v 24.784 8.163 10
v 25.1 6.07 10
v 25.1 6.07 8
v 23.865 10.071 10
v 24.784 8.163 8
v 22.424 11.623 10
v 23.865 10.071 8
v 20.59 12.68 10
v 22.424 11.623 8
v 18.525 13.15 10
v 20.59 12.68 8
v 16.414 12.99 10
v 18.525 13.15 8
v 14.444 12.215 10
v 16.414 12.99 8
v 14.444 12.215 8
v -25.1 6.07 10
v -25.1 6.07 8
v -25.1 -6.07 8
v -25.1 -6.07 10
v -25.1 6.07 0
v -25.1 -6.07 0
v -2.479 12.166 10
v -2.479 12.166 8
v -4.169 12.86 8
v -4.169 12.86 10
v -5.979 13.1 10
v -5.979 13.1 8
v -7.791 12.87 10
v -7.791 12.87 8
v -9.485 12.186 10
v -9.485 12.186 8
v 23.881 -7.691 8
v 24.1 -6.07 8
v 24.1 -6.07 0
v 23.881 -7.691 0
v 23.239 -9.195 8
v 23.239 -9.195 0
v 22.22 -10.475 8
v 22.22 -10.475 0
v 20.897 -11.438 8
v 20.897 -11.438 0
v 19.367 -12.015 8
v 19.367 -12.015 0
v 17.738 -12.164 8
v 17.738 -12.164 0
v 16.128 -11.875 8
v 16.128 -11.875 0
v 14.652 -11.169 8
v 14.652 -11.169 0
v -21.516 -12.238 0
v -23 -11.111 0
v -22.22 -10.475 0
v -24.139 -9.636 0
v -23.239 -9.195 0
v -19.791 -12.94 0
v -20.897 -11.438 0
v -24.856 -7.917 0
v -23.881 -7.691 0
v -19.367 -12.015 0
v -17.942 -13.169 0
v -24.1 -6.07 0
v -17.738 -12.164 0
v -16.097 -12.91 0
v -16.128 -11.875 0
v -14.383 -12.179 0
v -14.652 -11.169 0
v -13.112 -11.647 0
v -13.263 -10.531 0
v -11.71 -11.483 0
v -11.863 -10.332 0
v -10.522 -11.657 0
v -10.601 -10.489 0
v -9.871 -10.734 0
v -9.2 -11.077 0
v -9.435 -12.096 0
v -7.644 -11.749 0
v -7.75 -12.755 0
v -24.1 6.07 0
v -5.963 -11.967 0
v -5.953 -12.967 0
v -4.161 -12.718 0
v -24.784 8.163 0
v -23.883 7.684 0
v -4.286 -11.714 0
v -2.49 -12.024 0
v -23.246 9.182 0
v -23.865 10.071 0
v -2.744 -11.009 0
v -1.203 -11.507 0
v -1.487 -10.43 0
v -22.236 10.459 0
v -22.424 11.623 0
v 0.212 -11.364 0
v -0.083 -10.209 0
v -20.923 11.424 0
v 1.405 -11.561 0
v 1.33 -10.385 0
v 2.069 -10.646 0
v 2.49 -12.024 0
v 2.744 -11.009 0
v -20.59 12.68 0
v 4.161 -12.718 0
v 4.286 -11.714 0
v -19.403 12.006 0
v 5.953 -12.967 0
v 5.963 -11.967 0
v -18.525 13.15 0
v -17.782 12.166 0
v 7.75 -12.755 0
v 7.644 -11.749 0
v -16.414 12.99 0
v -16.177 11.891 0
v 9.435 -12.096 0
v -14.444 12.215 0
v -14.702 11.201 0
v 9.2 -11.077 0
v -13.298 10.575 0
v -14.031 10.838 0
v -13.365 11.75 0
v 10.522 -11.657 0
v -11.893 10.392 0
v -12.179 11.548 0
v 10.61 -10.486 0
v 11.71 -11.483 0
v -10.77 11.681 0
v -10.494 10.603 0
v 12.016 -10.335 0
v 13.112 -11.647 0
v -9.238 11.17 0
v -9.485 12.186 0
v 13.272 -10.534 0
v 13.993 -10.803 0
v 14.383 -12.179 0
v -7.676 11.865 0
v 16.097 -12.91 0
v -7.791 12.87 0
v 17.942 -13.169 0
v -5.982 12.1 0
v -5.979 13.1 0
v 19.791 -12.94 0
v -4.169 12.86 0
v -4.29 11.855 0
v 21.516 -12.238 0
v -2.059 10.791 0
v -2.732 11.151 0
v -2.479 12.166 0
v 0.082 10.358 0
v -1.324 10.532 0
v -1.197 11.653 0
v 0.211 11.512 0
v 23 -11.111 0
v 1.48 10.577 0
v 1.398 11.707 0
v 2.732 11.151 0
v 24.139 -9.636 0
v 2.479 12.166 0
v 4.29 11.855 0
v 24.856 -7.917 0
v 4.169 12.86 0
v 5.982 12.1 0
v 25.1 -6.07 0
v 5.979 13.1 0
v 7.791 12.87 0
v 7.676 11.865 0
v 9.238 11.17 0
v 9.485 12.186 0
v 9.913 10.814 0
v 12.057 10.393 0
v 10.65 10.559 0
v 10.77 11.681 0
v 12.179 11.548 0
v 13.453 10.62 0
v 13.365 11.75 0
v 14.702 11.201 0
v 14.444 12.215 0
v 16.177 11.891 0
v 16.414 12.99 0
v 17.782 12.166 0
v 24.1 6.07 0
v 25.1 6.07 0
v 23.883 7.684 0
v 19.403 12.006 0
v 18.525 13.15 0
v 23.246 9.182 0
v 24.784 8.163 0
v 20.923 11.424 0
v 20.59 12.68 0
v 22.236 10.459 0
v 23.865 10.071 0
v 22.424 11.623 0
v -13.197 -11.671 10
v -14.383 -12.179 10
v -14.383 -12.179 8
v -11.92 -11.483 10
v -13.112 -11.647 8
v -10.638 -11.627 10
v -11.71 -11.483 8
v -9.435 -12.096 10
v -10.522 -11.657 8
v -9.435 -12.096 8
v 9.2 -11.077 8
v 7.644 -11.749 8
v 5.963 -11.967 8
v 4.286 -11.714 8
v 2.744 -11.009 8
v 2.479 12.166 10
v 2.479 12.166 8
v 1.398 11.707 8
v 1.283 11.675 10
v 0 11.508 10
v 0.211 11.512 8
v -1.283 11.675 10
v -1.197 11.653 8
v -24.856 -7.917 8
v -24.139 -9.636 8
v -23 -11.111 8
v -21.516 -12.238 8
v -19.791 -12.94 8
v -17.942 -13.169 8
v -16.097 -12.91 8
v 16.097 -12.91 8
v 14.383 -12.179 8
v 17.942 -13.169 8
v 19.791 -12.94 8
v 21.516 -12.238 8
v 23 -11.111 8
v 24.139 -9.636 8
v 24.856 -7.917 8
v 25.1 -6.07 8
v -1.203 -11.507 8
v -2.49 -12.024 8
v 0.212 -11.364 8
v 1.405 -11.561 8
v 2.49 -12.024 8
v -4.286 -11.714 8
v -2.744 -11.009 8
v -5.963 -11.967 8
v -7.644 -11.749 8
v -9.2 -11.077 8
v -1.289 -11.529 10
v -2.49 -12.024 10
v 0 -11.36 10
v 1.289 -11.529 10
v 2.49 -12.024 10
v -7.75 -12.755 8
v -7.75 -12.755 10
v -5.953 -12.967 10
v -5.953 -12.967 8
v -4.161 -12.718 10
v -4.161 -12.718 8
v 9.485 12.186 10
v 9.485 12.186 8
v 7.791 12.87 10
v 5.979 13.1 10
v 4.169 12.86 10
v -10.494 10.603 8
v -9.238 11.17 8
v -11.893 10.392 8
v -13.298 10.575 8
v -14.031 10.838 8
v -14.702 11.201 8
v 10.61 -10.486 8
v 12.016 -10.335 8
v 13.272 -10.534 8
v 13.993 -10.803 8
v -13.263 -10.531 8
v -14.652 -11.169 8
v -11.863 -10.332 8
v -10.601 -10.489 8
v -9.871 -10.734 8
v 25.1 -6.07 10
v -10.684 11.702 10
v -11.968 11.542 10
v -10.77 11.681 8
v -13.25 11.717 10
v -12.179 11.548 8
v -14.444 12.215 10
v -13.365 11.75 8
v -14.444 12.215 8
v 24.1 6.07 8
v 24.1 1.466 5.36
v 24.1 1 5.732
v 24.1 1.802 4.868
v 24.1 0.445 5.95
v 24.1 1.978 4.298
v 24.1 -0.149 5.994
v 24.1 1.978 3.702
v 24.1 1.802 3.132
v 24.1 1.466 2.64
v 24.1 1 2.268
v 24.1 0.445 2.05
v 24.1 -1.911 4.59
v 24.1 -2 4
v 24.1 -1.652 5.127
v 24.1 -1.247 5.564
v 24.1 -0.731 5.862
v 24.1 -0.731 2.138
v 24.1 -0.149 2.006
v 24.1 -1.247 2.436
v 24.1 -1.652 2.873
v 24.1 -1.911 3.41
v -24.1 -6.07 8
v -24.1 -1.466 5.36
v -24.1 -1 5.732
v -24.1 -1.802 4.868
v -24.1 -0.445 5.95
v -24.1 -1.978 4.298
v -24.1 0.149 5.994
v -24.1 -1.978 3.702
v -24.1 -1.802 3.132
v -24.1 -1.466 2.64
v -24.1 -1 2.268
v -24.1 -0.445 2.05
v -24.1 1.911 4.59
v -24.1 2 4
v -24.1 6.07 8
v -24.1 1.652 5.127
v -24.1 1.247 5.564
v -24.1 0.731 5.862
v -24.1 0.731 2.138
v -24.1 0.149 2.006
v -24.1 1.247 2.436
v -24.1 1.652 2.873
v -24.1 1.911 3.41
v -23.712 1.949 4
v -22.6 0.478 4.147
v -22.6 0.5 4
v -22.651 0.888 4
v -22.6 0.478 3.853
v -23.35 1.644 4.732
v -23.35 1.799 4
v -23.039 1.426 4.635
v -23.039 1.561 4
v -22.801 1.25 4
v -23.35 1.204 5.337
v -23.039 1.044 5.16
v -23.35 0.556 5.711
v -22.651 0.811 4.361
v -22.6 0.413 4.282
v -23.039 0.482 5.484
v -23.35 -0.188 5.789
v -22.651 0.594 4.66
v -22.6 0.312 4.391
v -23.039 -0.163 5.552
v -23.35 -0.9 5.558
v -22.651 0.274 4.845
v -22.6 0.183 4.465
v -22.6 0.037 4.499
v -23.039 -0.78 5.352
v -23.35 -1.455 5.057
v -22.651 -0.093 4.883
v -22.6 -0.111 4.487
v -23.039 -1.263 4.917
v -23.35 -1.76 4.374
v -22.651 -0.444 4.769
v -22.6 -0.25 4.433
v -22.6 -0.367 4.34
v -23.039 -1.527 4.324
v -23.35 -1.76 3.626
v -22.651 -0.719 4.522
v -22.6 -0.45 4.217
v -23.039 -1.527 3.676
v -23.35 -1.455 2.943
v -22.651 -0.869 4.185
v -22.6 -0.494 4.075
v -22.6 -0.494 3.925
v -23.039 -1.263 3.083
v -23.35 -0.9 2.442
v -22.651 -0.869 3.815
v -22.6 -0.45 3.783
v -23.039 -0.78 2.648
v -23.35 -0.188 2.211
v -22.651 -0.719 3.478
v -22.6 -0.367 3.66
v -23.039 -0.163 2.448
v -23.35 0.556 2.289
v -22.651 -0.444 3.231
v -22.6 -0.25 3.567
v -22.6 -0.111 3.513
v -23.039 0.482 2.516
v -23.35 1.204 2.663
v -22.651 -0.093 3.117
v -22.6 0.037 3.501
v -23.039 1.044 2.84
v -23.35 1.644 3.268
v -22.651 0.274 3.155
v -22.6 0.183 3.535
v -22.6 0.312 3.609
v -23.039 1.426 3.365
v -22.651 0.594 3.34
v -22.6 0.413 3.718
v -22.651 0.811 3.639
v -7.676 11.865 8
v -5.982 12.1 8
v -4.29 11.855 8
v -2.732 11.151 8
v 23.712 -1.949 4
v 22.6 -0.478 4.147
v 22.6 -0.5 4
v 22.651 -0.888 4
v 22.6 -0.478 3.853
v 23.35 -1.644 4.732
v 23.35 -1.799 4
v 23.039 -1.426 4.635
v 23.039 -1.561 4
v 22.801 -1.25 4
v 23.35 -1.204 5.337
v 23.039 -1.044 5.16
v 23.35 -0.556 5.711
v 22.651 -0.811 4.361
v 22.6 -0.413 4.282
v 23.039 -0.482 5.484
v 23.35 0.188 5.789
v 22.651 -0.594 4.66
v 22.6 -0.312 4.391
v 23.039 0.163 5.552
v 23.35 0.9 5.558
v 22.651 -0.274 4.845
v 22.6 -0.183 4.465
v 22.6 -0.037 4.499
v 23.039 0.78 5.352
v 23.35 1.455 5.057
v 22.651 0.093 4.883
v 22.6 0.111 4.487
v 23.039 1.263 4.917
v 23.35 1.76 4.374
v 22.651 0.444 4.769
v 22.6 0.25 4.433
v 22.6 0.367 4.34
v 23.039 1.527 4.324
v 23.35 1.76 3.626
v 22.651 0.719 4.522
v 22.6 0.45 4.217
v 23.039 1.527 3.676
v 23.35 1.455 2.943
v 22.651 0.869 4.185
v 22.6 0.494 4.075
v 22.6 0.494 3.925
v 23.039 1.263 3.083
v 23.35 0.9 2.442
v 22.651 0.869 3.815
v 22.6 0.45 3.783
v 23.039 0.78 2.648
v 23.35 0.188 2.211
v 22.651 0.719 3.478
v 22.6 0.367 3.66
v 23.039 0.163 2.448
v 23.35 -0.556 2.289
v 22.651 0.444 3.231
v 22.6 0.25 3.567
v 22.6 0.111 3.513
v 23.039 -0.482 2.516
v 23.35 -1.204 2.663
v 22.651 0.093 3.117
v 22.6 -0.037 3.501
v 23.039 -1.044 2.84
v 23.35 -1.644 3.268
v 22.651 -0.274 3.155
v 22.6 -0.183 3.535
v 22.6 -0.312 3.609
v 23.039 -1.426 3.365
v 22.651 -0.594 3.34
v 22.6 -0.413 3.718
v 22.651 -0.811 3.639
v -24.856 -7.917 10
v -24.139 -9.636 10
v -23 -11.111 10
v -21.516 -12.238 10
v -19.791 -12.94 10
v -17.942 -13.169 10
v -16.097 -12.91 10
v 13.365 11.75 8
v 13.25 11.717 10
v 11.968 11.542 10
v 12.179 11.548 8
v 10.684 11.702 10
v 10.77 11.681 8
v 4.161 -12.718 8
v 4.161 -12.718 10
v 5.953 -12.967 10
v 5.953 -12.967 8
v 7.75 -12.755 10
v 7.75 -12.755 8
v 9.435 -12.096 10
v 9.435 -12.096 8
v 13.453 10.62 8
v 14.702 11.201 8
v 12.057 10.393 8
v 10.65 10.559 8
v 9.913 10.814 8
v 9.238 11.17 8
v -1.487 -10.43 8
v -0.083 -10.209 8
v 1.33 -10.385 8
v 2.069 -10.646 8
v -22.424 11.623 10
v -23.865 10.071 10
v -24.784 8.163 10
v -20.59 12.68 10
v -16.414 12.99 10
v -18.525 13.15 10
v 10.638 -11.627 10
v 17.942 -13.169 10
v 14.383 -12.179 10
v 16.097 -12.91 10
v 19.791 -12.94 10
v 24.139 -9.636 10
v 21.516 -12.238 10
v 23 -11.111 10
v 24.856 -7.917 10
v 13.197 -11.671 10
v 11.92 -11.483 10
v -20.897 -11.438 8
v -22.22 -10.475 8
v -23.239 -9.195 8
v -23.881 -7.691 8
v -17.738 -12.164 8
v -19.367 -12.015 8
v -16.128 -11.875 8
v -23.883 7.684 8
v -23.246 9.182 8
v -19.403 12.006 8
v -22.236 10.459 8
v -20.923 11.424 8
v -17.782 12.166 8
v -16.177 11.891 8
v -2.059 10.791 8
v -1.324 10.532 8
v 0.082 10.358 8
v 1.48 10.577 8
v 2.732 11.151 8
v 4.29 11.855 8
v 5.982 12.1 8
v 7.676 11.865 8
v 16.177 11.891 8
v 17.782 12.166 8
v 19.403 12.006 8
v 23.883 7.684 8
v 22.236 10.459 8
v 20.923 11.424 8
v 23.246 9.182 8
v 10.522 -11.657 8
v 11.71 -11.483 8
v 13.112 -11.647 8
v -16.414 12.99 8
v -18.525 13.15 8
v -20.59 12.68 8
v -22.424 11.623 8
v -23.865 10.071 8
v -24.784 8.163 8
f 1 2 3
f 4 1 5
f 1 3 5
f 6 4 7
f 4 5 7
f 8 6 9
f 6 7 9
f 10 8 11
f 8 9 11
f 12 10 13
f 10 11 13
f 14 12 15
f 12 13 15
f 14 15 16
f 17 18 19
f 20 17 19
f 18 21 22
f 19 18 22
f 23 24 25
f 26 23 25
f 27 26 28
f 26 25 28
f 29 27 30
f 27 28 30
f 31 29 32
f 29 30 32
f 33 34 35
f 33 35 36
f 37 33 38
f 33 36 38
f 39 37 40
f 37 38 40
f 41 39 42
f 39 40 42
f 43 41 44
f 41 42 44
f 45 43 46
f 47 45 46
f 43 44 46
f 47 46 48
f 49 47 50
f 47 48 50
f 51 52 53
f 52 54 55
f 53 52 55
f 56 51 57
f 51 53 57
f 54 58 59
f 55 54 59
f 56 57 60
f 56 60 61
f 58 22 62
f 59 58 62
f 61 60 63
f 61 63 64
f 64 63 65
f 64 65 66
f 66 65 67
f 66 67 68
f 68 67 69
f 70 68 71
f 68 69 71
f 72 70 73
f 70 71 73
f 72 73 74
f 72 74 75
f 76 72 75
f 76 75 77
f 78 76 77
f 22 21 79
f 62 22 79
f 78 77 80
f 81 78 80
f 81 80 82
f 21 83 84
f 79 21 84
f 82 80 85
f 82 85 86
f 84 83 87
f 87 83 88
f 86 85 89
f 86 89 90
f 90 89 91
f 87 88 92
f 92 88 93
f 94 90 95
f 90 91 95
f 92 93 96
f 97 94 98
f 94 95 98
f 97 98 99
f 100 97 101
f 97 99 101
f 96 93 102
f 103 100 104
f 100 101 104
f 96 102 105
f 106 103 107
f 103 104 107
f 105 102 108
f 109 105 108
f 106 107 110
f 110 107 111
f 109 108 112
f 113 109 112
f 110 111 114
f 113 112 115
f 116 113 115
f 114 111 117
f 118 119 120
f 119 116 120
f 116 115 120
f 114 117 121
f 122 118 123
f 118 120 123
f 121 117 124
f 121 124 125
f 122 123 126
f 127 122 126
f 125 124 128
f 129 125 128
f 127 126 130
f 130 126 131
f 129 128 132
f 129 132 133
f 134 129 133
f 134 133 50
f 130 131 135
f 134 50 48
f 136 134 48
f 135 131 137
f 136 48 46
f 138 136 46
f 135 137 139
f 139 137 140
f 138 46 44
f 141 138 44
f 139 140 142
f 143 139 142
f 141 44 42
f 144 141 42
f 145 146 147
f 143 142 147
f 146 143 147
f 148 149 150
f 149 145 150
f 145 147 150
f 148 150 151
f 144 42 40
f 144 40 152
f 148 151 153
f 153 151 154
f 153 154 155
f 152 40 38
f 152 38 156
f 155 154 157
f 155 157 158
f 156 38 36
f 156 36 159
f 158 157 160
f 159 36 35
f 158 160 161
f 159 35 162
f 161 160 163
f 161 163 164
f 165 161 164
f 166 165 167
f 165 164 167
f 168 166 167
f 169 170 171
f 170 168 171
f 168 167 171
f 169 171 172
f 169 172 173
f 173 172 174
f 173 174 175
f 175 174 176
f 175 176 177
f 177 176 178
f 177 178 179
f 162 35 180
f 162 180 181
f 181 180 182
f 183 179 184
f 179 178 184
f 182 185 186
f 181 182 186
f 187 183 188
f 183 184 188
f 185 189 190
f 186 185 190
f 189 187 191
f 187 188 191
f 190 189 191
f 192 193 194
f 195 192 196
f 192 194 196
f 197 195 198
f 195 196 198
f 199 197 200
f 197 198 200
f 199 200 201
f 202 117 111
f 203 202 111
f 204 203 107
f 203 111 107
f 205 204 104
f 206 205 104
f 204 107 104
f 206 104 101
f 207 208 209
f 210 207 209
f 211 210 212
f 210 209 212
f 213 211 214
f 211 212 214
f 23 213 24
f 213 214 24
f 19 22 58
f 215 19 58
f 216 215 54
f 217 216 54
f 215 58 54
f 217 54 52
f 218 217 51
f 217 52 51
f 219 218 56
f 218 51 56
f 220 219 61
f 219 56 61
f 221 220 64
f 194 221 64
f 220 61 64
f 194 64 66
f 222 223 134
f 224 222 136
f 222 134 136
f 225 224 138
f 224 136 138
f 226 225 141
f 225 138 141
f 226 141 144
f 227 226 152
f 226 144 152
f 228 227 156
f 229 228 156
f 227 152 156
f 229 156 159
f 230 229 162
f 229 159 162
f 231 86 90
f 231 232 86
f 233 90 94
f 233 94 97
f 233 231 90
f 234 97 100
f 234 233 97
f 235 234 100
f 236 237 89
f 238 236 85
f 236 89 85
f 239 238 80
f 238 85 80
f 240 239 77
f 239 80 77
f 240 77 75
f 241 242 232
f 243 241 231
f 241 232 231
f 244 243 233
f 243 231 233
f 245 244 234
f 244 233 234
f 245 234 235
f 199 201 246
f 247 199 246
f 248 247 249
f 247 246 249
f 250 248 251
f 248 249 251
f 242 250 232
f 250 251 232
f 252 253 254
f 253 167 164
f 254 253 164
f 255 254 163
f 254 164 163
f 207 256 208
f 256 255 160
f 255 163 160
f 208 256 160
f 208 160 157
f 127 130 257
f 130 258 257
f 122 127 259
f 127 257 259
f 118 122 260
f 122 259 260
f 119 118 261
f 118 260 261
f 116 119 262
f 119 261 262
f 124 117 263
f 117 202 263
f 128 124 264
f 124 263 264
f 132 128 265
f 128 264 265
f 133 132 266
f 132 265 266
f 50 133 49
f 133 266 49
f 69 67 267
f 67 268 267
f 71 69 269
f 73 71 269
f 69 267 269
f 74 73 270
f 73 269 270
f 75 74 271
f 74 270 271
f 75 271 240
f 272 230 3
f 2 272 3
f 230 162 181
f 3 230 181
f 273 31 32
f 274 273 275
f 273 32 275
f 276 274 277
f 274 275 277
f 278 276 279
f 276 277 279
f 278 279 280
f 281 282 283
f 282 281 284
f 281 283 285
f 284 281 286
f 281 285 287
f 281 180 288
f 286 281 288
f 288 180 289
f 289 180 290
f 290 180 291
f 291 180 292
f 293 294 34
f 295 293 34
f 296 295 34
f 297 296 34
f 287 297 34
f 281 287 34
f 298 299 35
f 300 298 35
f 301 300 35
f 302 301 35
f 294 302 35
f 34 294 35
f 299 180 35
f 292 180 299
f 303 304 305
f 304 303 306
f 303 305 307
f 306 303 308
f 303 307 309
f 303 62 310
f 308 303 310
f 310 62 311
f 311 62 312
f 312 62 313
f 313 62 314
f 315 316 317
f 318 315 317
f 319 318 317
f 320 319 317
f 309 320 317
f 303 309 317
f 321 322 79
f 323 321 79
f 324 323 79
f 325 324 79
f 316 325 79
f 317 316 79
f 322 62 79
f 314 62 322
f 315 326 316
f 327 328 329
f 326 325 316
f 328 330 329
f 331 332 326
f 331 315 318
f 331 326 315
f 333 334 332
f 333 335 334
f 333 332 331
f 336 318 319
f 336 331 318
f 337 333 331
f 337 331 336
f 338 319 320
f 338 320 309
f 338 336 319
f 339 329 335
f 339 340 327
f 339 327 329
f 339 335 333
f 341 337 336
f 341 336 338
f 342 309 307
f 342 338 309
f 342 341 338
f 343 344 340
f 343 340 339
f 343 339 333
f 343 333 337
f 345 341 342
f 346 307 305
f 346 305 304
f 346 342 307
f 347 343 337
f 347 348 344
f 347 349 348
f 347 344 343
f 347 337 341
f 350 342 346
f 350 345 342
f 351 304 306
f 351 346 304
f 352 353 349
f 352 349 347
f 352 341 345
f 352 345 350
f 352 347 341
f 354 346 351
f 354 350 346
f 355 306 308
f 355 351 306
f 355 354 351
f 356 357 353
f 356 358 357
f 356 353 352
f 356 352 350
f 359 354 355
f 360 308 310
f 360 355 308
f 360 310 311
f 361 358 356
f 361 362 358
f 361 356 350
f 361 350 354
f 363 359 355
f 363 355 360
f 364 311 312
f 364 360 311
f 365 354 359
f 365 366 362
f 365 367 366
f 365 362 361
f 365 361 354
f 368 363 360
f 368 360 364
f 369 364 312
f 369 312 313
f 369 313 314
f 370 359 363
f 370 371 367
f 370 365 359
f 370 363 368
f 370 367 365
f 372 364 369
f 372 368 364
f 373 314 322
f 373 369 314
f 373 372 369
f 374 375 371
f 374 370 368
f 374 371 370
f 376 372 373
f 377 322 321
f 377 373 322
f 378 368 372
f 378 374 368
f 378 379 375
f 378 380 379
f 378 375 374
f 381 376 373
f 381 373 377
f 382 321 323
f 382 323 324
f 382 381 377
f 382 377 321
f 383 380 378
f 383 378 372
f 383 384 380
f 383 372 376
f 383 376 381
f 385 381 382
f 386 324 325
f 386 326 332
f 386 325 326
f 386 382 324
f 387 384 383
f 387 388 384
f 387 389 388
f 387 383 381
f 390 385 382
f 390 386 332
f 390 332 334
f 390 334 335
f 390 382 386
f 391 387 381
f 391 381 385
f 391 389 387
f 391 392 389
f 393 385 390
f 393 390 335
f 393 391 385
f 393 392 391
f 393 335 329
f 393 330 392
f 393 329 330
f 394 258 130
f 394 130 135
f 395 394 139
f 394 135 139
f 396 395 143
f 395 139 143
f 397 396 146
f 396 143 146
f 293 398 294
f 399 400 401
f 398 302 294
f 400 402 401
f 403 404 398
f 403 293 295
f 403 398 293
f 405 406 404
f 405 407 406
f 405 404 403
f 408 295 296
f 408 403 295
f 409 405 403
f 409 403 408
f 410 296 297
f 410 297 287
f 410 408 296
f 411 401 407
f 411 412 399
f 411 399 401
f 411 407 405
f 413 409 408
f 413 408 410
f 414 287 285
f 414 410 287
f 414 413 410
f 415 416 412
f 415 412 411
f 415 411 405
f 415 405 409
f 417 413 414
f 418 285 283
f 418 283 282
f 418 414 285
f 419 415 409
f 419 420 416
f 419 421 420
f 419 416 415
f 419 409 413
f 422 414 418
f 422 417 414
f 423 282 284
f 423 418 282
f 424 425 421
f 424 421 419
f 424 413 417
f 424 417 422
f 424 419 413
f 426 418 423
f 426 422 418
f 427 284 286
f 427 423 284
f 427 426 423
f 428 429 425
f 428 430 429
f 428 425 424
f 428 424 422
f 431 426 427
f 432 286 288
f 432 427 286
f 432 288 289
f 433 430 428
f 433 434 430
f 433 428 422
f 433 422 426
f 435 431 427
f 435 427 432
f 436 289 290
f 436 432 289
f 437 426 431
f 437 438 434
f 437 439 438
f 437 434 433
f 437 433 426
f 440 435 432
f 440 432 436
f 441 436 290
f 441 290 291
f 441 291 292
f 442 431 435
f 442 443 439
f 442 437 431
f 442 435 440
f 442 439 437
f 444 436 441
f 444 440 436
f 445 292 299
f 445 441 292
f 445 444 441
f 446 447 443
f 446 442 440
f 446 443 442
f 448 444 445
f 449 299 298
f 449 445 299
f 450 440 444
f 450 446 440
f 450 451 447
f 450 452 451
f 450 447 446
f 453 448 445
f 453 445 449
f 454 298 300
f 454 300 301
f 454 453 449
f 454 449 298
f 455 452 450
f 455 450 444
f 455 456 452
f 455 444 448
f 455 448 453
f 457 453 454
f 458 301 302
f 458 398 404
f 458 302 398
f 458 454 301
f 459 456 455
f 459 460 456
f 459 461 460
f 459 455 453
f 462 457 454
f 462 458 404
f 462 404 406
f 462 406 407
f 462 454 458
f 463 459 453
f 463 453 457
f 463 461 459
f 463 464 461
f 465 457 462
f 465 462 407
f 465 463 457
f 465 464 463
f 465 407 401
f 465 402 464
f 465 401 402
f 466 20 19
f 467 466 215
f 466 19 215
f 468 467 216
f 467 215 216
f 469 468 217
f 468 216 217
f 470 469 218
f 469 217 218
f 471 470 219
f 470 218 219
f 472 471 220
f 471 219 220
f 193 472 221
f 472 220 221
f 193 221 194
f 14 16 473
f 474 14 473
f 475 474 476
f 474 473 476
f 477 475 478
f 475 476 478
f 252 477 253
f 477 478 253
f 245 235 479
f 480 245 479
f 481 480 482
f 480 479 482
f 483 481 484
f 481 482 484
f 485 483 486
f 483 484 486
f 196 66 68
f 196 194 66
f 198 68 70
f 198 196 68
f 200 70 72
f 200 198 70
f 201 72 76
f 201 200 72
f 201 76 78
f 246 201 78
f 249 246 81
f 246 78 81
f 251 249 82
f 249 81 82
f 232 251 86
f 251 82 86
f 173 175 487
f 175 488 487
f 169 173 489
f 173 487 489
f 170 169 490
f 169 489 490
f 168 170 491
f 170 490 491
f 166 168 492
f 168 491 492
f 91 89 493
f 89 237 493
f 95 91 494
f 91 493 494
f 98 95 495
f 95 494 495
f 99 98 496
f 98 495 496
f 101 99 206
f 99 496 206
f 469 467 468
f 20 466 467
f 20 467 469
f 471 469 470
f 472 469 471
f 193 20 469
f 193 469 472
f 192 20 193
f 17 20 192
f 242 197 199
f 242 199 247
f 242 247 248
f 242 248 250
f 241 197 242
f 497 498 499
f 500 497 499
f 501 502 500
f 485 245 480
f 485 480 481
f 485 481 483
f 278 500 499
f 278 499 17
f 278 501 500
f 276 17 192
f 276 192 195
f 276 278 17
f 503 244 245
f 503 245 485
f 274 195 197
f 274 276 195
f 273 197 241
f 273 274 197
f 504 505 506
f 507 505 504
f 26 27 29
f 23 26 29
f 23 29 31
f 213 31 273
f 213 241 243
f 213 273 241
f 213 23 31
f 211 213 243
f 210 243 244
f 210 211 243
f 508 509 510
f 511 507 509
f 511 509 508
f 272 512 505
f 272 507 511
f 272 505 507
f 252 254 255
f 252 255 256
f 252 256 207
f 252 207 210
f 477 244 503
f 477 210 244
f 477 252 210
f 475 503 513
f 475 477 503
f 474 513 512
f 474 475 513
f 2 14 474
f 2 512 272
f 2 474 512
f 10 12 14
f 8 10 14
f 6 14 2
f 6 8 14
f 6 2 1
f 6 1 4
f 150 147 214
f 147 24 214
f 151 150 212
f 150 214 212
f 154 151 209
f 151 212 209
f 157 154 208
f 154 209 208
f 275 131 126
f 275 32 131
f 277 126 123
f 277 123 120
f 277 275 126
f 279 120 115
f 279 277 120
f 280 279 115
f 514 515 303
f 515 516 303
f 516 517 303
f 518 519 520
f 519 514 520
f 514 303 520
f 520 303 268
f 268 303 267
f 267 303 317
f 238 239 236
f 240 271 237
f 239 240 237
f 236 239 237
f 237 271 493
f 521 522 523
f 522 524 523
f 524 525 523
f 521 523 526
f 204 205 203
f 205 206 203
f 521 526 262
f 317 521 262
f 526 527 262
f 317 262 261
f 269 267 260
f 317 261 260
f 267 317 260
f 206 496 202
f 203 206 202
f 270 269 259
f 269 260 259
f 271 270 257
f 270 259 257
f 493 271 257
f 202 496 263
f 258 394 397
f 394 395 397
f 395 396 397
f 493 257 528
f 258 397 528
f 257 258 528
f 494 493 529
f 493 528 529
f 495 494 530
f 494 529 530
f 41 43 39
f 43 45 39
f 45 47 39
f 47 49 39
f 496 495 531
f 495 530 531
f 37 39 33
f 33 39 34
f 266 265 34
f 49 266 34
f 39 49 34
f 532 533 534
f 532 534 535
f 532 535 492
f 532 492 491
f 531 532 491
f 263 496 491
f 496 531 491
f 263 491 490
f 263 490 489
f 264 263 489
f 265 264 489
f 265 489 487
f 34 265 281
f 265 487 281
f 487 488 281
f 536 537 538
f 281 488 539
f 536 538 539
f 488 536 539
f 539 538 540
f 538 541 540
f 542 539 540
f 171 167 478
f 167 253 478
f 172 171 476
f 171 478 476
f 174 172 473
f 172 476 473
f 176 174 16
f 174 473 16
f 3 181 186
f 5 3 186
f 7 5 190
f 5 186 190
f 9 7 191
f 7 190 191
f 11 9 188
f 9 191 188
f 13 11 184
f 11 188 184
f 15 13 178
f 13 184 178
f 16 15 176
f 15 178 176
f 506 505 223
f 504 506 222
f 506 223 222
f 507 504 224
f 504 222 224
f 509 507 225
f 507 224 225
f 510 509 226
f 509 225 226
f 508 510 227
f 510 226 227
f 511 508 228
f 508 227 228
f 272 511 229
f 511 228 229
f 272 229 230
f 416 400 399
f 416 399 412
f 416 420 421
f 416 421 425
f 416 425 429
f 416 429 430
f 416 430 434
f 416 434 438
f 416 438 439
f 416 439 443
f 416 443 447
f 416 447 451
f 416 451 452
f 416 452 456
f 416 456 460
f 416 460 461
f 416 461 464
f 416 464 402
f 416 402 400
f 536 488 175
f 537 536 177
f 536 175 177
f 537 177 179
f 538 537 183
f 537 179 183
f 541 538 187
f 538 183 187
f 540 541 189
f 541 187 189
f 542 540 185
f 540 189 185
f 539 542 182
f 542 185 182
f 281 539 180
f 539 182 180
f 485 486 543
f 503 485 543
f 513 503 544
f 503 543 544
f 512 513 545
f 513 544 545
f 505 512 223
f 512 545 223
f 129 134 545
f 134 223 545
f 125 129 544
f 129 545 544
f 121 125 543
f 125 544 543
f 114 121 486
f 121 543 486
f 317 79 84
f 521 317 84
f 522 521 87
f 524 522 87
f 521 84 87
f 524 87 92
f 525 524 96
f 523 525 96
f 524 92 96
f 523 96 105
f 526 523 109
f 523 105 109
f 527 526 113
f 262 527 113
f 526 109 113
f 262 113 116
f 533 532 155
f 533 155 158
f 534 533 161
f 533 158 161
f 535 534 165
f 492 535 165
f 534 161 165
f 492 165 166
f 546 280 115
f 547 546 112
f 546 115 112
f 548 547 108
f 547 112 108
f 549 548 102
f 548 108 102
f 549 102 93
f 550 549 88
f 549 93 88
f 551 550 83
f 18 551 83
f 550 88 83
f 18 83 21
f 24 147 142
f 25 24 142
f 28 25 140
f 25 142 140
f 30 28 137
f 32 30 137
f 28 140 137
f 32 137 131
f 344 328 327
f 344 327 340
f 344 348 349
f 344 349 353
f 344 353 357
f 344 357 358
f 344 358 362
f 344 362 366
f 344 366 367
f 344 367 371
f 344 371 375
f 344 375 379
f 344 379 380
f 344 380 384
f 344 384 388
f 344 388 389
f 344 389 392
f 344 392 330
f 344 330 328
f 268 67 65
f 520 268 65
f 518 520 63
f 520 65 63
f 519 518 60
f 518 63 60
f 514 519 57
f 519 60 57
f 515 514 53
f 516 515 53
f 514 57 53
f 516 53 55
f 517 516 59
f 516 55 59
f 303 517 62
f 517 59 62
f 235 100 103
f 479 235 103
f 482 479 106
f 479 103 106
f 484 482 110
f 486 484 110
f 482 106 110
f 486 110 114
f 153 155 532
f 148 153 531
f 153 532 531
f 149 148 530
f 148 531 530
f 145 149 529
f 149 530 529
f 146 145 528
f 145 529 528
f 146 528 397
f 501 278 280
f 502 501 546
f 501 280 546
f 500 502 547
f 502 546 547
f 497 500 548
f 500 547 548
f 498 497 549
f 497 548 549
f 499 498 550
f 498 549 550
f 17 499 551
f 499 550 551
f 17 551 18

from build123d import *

# Parameters (mm, degrees)
F1_DEPTH  = 8
F2_R      = 5
F3_R      = 5.1
F5_DEPTH  = 2
F6_R      = 2
F7_DEPTH  = 1.5
F8_R      = 1.49999
F9_R      = 2
F10_DEPTH = 1.5
F11_R     = 1.49999


# Not quite as in the source:
# - a fillet or chamfer is up to 0.001 mm smaller than in the source, because OpenCascade refuses the exact size


with BuildPart() as f1:
    # F0 (on Top) → F1 (new body)
    with BuildSketch(Plane.XY):
        with BuildLine():
            ThreePointArc((0, 9.7960505792), (-5.9794748492, 13.0999703322), (-11.9779520569, 9.830677382))
            ThreePointArc((-11.9779520569, 9.830677382), (-19.9562029041, 12.8948954194), (-25.1, 6.0697016347))
            Line((-25.1, 6.0697016347), (-25.1, -6.0697016347))
            ThreePointArc((-25.1, -6.0697016347), (-19.9296547743, -12.9024486996), (-11.9488922671, -9.7837419151))
            ThreePointArc((-11.9488922671, -9.7837419151), (-5.9300692346, -12.9669396851), (0, -9.6213070677))
            ThreePointArc((0, -9.6213070677), (5.9300692346, -12.9669396851), (11.9488922671, -9.7837419151))
            ThreePointArc((11.9488922671, -9.7837419151), (19.9296547743, -12.9024486996), (25.1, -6.0697016347))
            Line((25.1, -6.0697016347), (25.1, 6.0697016347))
            ThreePointArc((25.1, 6.0697016347), (19.9562029041, 12.8948954194), (11.9779520569, 9.830677382))
            ThreePointArc((11.9779520569, 9.830677382), (5.9794748492, 13.0999703322), (0, 9.7960505792))
        make_face()
        with BuildLine():
            ThreePointArc((-24.1, 6.0697016347), (-18.5343432382, 12.1462530666), (-11.9936139988, 7.1342800509))
            ThreePointArc((-11.9936139988, 7.1342800509), (-5.9825651004, 12.0999750839), (0, 7.1))
            ThreePointArc((0, 7.1), (5.9825651004, 12.0999750839), (11.9936139988, 7.1342800509))
            ThreePointArc((11.9936139988, 7.1342800509), (18.5343432382, 12.1462530666), (24.1, 6.0697016347))
            Line((24.1, 6.0697016347), (24.1, -6.0697016347))
            ThreePointArc((24.1, -6.0697016347), (18.5343432382, -12.1462530666), (11.9936139988, -7.1342800509))
            ThreePointArc((11.9936139988, -7.1342800509), (5.8623077698, -11.9653833554), (0, -6.8111789722))
            ThreePointArc((0, -6.8111789722), (-5.8623077698, -11.9653833554), (-11.9936139988, -7.1342800509))
            ThreePointArc((-11.9936139988, -7.1342800509), (-18.5343432382, -12.1462530666), (-24.1, -6.0697016347))
            Line((-24.1, -6.0697016347), (-24.1, 6.0697016347))
        make_face(mode=Mode.SUBTRACT)
    extrude(amount=F1_DEPTH)

    # F2
    f2_edges = [f1.edges().sort_by_distance(p)[0] for p in [
        (-11.948892, -9.783742, 4),
        (0, -9.621307, 4),
        (11.948892, -9.783742, 4),
        (-11.977952, 9.830677, 4),
        (0, 9.796051, 4),
        (11.977952, 9.830677, 4),
    ]]
    fillet(f2_edges, radius=F2_R)

    # F3
    f3_edges = [f1.edges().sort_by_distance(p)[0] for p in [
        (-11.993614, -7.13428, 4),
        (0, -6.811179, 4),
        (11.993614, -7.13428, 4),
        (11.993614, 7.13428, 4),
        (0, 7.1, 4),
        (-11.993614, 7.13428, 4),
    ]]
    fillet(f3_edges, radius=F3_R)

    # F4 (on face) → F5 (join)
    with BuildSketch(Plane.XY.offset(8)):
        with BuildLine():
            ThreePointArc((-9.4848491067, 12.1859378193), (-11.9680100538, 11.5423164018), (-14.4435267926, 12.2147401477))
            ThreePointArc((-14.4435267926, 12.2147401477), (-21.5467619195, 12.2203503717), (-25.1, 6.0697016347))
            Line((-25.1, 6.0697016347), (-25.1, -6.0697016347))
            ThreePointArc((-25.1, -6.0697016347), (-21.5163446166, -12.2377905233), (-14.3830082993, -12.179314637))
            ThreePointArc((-14.3830082993, -12.179314637), (-11.9202167891, -11.4825711508), (-9.4353135356, -12.0957997614))
            ThreePointArc((-9.4353135356, -12.0957997614), (-5.9534768613, -12.9672192968), (-2.4903217652, -12.0242901298))
            ThreePointArc((-2.4903217652, -12.0242901298), (0, -11.3599904776), (2.4903217652, -12.0242901298))
            ThreePointArc((2.4903217652, -12.0242901298), (5.9534768613, -12.9672192968), (9.4353135356, -12.0957997614))
            ThreePointArc((9.4353135356, -12.0957997614), (11.9202167891, -11.4825711508), (14.3830082993, -12.179314637))
            ThreePointArc((14.3830082993, -12.179314637), (21.5163446166, -12.2377905233), (25.1, -6.0697016347))
            Line((25.1, -6.0697016347), (25.1, 6.0697016347))
            ThreePointArc((25.1, 6.0697016347), (21.5467619195, 12.2203503717), (14.4435267926, 12.2147401477))
            ThreePointArc((14.4435267926, 12.2147401477), (11.9680100538, 11.5423164018), (9.4848491067, 12.1859378193))
            ThreePointArc((9.4848491067, 12.1859378193), (5.9794143891, 13.0999701572), (2.479338843, 12.1656260848))
            ThreePointArc((2.479338843, 12.1656260848), (0, 11.5076162853), (-2.479338843, 12.1656260848))
            ThreePointArc((-2.479338843, 12.1656260848), (-5.9794143891, 13.0999701572), (-9.4848491067, 12.1859378193))
        make_face()
    extrude(amount=F5_DEPTH)

    # F6 (on face) → F7 (join)
    with BuildSketch(Plane.YZ.offset(-24.1)):
        with Locations((0, 4)):
            Circle(F6_R)
    extrude(amount=F7_DEPTH)

    # F8 (radius 1.5 in the source; OpenCascade refuses exactly that, so slightly less here)
    f8_edges = [f1.edges().sort_by_distance(p)[0] for p in [
        (-22.6, -2, 4),
    ]]
    fillet(f8_edges, radius=F8_R)

    # F9 (on face) → F10 (join)
    with BuildSketch(Plane(origin=(24.1, 0, 0), x_dir=(0, -1, 0), z_dir=(-1, 0, 0))):
        with Locations((0, 4)):
            Circle(F9_R)
    extrude(amount=F10_DEPTH)

    # F11 (radius 1.5 in the source; OpenCascade refuses exactly that, so slightly less here)
    f11_edges = [f1.edges().sort_by_distance(p)[0] for p in [
        (22.6, 2, 4),
    ]]
    fillet(f11_edges, radius=F11_R)


solid = f1.part
